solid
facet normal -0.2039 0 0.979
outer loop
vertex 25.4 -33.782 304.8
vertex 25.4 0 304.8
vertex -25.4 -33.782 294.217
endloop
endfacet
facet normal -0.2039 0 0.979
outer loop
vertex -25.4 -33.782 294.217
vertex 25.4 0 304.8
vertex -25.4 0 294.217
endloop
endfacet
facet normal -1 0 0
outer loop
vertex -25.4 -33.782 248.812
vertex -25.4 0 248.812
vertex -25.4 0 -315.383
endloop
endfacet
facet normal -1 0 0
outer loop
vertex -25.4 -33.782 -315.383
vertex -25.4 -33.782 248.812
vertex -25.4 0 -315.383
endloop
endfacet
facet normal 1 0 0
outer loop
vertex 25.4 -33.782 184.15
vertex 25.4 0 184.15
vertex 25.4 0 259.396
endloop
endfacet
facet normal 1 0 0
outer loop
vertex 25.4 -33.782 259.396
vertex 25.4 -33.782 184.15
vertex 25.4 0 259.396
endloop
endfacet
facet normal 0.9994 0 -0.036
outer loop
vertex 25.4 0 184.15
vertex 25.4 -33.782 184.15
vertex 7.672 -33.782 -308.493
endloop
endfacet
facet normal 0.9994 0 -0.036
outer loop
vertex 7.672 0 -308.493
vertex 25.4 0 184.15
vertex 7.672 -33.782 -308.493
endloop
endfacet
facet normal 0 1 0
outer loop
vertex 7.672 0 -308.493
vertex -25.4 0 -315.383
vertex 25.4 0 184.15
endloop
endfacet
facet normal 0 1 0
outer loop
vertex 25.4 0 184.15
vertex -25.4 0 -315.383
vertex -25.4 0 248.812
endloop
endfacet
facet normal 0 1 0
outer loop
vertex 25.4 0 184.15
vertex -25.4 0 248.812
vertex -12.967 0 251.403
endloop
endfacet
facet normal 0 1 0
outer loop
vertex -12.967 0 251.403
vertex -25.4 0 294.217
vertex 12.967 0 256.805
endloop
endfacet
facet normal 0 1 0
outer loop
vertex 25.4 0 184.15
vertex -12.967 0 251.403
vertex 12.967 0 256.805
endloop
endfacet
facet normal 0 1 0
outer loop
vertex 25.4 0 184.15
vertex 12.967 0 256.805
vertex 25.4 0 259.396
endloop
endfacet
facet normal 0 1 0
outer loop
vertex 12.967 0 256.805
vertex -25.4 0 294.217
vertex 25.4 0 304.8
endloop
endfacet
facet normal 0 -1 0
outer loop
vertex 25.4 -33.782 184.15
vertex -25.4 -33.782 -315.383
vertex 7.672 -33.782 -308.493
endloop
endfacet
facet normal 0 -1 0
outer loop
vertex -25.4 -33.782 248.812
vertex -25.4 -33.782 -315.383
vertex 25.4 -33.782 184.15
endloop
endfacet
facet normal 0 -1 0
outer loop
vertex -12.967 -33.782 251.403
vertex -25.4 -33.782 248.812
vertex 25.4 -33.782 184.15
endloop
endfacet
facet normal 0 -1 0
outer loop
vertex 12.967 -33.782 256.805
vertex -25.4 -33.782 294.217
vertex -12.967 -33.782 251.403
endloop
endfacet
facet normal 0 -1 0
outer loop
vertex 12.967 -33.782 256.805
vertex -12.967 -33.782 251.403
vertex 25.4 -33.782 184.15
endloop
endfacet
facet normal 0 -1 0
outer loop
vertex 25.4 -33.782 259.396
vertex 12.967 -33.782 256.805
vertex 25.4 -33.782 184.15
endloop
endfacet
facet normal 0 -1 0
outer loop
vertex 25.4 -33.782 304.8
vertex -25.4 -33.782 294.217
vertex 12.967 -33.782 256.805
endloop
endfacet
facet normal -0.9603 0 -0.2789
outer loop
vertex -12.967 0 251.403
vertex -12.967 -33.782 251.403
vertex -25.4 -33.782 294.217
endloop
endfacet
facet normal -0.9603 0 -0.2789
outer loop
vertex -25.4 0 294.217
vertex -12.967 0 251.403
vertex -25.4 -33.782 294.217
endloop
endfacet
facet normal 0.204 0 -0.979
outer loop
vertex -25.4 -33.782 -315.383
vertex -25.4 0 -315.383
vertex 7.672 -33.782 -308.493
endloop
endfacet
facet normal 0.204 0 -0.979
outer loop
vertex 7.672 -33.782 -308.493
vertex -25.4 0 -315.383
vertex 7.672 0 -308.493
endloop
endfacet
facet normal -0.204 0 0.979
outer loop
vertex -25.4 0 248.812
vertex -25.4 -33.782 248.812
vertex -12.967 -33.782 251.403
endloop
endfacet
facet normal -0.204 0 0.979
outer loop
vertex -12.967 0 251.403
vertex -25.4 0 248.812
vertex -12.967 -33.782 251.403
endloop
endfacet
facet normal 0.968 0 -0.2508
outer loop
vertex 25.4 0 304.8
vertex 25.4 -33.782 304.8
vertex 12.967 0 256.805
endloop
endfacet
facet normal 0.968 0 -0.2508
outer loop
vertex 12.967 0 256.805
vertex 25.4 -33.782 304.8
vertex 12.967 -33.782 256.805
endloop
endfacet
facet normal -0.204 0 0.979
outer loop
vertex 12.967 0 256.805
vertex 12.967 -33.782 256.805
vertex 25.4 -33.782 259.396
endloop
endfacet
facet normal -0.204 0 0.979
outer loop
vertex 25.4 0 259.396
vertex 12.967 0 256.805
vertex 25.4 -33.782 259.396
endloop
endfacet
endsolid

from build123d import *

# Parameters (mm, degrees)
F1_DEPTH = 33.782
F3_DEPTH = 33.783
F5_DEPTH = 33.783


with BuildPart() as f1:
    # F0 (on Front) → F1 (new body)
    with BuildSketch(Plane.XZ):
        Polygon((25.4, -304.8), (25.4, 304.8), (-25.4, 294.216667), (-25.4, -315.383333), align=None)
    extrude(amount=F1_DEPTH)

    # F2 (on face) → F3 (cut, through all)
    with BuildSketch(Plane.XZ.offset(33.782)):
        Polygon((25.4, 184.15), (7.671917, -308.493351), (25.4, -304.8), align=None)
    extrude(amount=-F3_DEPTH, mode=Mode.SUBTRACT)

    # F4 (on face) → F5 (cut, through all)
    with BuildSketch(Plane.XZ.offset(33.782)):
        Polygon((-25.4, 294.216667), (-25.4, 248.812286), (-12.966949, 251.402505), align=None)
        Polygon((25.4, 259.395619), (25.4, 304.8), (12.966949, 256.8054), align=None)
    extrude(amount=-F5_DEPTH, mode=Mode.SUBTRACT)


solid = f1.part
